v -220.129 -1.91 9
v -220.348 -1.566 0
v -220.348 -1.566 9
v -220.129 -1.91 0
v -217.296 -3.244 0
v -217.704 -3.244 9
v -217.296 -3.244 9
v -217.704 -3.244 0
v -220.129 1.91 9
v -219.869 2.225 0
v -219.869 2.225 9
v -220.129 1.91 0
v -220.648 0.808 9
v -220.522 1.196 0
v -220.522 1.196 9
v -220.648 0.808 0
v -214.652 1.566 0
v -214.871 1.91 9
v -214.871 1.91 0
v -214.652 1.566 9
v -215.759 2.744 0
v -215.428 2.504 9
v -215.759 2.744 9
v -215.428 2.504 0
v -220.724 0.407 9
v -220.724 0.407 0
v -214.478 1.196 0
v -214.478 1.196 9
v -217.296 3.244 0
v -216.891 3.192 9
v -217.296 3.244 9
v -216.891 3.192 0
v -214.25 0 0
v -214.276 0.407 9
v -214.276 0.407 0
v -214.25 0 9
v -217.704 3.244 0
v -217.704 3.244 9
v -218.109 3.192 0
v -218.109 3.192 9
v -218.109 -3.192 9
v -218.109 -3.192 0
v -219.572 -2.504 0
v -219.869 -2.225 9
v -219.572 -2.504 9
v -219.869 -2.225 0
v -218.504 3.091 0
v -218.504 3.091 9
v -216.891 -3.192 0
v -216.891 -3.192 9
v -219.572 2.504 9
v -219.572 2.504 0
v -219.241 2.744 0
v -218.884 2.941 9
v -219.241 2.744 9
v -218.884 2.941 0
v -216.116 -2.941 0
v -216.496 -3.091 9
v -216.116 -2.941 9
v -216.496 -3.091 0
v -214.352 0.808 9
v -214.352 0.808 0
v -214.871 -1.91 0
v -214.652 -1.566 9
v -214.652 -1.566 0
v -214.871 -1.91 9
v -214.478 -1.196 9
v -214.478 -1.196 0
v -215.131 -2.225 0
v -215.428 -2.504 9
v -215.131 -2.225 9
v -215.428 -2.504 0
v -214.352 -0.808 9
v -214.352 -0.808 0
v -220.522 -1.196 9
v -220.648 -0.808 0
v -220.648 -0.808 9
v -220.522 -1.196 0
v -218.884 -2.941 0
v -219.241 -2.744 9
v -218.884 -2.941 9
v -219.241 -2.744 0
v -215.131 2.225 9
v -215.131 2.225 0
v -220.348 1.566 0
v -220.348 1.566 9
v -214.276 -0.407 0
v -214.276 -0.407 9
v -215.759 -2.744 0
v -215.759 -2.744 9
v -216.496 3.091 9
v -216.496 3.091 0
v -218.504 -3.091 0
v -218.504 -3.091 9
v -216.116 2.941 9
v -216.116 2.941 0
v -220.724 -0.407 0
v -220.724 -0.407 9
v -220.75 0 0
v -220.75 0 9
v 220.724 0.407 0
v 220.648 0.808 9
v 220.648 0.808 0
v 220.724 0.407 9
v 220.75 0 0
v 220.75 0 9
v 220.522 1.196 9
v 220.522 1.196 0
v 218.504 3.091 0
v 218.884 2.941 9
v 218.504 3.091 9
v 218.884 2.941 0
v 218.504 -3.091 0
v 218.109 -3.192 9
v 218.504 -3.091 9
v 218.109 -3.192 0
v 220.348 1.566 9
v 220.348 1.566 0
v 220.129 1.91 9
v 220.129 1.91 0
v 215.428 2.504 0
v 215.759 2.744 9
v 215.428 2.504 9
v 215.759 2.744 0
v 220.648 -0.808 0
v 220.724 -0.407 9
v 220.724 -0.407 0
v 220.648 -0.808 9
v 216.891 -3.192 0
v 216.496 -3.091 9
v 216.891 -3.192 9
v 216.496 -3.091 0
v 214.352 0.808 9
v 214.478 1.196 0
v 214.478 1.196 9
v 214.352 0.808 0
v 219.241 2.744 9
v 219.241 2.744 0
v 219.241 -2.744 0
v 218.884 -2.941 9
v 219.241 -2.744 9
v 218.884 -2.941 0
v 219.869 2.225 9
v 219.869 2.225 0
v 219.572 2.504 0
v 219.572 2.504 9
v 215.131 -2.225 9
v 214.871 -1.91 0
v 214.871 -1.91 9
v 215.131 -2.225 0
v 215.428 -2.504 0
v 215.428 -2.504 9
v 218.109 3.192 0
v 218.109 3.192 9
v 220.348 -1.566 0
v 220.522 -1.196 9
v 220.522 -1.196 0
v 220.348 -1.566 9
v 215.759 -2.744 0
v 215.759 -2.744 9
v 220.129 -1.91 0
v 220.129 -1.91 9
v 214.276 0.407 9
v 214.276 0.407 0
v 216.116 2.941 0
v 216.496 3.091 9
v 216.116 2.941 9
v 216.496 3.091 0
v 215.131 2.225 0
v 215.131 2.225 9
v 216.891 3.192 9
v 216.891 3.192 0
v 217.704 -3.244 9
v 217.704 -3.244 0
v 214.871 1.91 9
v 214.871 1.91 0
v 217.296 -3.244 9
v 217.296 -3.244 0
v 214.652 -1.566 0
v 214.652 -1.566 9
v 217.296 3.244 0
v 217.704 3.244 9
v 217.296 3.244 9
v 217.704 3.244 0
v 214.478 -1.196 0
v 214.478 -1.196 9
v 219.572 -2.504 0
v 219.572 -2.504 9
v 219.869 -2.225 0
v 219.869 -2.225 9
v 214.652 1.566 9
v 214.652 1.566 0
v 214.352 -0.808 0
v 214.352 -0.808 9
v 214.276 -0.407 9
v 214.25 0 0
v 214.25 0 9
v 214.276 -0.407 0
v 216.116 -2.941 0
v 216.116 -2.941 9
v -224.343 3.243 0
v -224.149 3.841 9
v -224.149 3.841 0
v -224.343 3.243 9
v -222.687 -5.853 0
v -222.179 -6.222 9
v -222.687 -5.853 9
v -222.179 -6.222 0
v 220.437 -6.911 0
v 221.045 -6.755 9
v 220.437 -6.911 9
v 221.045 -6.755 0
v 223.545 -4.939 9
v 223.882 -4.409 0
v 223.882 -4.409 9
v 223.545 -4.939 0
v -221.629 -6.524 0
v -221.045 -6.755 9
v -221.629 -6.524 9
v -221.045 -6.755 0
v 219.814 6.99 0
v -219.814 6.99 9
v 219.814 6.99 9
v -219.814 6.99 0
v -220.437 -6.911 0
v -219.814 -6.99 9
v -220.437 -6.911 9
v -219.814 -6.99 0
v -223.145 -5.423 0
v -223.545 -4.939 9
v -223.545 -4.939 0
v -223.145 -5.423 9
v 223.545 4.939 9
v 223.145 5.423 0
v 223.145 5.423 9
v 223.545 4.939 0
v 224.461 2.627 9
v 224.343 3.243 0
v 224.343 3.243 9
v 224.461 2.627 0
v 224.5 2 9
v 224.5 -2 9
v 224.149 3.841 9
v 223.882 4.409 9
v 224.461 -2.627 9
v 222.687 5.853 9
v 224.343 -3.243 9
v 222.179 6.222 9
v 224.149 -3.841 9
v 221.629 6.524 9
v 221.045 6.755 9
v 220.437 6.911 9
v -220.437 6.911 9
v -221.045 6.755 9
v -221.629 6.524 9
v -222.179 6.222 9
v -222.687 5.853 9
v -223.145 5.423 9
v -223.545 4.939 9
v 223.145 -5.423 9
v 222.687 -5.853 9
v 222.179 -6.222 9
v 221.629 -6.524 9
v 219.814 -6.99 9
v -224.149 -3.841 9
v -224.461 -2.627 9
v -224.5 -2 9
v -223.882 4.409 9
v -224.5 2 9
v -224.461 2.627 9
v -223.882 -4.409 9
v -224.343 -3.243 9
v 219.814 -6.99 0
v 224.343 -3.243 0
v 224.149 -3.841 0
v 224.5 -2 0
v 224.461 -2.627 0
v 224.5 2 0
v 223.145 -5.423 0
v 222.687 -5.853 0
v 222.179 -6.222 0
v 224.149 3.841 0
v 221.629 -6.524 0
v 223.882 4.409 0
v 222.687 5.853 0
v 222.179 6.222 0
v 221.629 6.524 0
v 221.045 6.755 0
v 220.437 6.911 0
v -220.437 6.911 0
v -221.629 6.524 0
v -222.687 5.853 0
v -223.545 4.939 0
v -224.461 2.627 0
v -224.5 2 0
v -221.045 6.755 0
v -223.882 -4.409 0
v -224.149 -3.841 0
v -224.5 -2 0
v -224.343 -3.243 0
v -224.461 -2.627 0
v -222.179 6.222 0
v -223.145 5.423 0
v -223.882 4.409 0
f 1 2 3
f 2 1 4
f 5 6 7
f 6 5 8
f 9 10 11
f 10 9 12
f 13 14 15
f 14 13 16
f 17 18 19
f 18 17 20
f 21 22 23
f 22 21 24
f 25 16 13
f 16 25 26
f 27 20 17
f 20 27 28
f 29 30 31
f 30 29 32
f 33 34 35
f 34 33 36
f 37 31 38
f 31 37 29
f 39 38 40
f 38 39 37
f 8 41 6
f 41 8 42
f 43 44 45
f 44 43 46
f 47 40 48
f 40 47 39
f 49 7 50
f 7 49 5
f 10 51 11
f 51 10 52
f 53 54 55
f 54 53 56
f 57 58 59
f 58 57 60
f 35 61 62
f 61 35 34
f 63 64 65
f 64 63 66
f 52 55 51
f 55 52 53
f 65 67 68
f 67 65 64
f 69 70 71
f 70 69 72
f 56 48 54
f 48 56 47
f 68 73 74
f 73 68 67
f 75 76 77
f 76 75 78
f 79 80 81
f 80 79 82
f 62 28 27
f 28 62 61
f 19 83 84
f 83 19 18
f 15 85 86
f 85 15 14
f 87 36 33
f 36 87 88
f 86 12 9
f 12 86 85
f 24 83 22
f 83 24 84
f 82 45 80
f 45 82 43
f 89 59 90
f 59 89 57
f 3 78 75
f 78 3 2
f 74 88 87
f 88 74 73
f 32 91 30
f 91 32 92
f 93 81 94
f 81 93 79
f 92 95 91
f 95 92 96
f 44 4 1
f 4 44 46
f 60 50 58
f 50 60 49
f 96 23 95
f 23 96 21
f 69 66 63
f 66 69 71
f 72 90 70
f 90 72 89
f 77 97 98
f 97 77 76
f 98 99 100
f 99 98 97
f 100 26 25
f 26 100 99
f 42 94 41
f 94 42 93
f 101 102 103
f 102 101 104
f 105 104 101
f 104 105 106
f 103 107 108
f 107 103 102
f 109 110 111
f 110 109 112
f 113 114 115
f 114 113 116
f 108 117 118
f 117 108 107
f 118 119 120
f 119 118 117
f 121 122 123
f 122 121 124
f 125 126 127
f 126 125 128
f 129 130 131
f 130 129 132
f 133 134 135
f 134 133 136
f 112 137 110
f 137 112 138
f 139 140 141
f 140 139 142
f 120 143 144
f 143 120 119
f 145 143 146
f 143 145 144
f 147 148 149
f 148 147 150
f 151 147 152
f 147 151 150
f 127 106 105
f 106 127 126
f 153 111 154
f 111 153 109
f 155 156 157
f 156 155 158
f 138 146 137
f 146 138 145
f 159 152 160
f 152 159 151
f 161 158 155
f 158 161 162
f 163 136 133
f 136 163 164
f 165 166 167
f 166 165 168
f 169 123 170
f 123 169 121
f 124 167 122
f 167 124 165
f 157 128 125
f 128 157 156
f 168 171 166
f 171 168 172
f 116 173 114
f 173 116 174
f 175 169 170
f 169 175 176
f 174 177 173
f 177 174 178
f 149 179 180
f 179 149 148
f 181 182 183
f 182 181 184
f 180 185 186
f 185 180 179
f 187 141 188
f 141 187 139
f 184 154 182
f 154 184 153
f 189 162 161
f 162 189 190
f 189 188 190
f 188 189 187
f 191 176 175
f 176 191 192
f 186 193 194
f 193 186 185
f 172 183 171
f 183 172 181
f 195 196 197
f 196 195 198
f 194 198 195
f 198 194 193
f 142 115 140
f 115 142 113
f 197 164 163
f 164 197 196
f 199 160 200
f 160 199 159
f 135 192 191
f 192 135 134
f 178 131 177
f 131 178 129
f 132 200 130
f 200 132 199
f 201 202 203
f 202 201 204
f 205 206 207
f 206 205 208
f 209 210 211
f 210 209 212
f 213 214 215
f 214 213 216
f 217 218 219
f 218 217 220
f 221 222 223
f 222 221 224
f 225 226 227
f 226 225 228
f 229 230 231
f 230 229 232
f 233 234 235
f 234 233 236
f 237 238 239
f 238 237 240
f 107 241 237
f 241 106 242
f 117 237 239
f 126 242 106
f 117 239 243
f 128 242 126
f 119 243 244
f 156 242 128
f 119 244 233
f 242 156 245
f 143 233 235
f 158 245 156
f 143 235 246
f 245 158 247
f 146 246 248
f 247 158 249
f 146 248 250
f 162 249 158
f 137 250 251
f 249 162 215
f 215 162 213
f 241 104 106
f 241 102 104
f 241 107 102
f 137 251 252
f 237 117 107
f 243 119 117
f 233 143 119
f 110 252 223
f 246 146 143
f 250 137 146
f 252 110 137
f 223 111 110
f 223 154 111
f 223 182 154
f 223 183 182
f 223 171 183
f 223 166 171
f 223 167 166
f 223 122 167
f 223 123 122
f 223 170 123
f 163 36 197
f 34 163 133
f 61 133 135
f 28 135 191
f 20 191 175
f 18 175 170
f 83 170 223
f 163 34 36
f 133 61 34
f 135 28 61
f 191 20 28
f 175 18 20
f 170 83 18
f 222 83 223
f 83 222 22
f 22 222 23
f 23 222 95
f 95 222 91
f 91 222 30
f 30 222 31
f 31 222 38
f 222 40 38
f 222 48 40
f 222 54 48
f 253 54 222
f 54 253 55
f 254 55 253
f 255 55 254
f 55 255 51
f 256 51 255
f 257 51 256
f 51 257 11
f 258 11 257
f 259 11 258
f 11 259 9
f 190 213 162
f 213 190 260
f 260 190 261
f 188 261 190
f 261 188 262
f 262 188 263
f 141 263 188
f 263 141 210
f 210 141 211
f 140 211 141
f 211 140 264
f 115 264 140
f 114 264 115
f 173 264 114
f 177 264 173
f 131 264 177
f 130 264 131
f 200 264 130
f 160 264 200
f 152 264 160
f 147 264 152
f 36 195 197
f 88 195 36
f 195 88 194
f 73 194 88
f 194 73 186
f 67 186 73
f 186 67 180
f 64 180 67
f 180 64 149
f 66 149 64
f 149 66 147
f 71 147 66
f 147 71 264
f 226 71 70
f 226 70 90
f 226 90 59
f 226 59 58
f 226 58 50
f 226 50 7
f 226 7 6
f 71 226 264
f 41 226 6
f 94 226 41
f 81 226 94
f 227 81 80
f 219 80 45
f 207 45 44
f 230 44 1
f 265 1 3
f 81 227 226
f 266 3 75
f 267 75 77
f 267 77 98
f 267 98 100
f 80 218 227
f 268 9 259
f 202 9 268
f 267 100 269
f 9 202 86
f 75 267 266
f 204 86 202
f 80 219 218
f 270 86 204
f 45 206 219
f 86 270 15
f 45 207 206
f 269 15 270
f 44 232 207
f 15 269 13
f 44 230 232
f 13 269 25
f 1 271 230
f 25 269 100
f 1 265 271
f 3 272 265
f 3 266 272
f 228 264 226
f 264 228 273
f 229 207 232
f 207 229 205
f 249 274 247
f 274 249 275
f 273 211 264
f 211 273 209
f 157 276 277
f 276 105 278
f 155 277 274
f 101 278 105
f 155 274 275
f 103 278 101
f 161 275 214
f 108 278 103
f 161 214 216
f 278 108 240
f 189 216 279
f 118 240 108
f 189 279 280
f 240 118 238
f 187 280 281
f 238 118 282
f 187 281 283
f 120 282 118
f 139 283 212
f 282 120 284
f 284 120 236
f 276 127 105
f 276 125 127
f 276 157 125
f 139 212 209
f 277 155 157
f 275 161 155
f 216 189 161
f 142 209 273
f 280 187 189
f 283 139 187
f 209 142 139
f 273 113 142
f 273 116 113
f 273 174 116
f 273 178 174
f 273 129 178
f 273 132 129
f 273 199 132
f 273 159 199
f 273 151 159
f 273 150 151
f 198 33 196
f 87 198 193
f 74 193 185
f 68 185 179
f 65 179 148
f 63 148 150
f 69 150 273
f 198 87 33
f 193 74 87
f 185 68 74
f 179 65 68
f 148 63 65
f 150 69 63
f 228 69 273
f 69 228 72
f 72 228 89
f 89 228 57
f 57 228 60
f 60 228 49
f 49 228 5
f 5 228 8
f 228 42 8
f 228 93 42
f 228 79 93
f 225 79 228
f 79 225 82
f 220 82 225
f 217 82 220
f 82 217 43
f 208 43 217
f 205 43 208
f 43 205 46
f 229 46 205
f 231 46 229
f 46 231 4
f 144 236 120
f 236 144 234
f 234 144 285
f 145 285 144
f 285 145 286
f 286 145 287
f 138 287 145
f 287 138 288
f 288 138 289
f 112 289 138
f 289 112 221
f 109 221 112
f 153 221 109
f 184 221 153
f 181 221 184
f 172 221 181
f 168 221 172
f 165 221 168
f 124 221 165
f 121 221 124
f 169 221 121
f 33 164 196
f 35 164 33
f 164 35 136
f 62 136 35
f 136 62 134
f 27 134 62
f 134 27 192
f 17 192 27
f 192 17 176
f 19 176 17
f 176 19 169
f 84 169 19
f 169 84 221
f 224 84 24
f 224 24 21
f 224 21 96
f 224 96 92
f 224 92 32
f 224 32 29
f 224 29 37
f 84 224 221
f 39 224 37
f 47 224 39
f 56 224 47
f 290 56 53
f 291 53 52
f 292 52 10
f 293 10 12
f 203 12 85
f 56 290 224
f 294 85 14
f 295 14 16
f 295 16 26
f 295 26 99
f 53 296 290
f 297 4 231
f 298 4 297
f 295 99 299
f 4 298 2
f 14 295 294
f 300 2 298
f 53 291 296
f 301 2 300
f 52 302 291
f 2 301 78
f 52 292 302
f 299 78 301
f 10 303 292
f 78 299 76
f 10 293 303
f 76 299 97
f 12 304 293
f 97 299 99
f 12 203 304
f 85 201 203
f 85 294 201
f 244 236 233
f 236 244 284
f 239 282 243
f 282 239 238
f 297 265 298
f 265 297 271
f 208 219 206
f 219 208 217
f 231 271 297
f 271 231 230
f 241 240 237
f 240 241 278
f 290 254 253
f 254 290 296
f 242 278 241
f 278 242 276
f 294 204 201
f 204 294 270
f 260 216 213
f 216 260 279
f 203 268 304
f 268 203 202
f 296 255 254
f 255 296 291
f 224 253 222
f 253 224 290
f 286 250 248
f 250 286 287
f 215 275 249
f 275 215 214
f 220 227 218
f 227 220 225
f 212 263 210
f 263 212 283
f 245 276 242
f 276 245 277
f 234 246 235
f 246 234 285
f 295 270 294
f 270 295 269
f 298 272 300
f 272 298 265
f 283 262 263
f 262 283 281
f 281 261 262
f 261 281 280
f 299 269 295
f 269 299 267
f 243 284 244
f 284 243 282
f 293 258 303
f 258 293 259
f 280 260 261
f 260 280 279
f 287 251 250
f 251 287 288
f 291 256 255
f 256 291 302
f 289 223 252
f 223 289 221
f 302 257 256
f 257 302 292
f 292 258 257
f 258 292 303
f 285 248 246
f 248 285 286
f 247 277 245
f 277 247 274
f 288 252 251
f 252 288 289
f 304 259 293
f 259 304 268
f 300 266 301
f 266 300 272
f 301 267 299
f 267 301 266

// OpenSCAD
$fn = 50;


difference() {
	union() {
		hull() {
			translate(v = [-219.5000000000, 2.0000000000, 0]) {
				cylinder(h = 9, r = 5);
			}
			translate(v = [219.5000000000, 2.0000000000, 0]) {
				cylinder(h = 9, r = 5);
			}
			translate(v = [-219.5000000000, -2.0000000000, 0]) {
				cylinder(h = 9, r = 5);
			}
			translate(v = [219.5000000000, -2.0000000000, 0]) {
				cylinder(h = 9, r = 5);
			}
		}
	}
	union() {
		translate(v = [-217.5000000000, 0.0000000000, -100.0000000000]) {
			cylinder(h = 200, r = 3.2500000000);
		}
		translate(v = [-217.5000000000, 0.0000000000, -100.0000000000]) {
			cylinder(h = 200, r = 3.2500000000);
		}
		translate(v = [217.5000000000, 0.0000000000, -100.0000000000]) {
			cylinder(h = 200, r = 3.2500000000);
		}
		translate(v = [217.5000000000, 0.0000000000, -100.0000000000]) {
			cylinder(h = 200, r = 3.2500000000);
		}
	}
}
